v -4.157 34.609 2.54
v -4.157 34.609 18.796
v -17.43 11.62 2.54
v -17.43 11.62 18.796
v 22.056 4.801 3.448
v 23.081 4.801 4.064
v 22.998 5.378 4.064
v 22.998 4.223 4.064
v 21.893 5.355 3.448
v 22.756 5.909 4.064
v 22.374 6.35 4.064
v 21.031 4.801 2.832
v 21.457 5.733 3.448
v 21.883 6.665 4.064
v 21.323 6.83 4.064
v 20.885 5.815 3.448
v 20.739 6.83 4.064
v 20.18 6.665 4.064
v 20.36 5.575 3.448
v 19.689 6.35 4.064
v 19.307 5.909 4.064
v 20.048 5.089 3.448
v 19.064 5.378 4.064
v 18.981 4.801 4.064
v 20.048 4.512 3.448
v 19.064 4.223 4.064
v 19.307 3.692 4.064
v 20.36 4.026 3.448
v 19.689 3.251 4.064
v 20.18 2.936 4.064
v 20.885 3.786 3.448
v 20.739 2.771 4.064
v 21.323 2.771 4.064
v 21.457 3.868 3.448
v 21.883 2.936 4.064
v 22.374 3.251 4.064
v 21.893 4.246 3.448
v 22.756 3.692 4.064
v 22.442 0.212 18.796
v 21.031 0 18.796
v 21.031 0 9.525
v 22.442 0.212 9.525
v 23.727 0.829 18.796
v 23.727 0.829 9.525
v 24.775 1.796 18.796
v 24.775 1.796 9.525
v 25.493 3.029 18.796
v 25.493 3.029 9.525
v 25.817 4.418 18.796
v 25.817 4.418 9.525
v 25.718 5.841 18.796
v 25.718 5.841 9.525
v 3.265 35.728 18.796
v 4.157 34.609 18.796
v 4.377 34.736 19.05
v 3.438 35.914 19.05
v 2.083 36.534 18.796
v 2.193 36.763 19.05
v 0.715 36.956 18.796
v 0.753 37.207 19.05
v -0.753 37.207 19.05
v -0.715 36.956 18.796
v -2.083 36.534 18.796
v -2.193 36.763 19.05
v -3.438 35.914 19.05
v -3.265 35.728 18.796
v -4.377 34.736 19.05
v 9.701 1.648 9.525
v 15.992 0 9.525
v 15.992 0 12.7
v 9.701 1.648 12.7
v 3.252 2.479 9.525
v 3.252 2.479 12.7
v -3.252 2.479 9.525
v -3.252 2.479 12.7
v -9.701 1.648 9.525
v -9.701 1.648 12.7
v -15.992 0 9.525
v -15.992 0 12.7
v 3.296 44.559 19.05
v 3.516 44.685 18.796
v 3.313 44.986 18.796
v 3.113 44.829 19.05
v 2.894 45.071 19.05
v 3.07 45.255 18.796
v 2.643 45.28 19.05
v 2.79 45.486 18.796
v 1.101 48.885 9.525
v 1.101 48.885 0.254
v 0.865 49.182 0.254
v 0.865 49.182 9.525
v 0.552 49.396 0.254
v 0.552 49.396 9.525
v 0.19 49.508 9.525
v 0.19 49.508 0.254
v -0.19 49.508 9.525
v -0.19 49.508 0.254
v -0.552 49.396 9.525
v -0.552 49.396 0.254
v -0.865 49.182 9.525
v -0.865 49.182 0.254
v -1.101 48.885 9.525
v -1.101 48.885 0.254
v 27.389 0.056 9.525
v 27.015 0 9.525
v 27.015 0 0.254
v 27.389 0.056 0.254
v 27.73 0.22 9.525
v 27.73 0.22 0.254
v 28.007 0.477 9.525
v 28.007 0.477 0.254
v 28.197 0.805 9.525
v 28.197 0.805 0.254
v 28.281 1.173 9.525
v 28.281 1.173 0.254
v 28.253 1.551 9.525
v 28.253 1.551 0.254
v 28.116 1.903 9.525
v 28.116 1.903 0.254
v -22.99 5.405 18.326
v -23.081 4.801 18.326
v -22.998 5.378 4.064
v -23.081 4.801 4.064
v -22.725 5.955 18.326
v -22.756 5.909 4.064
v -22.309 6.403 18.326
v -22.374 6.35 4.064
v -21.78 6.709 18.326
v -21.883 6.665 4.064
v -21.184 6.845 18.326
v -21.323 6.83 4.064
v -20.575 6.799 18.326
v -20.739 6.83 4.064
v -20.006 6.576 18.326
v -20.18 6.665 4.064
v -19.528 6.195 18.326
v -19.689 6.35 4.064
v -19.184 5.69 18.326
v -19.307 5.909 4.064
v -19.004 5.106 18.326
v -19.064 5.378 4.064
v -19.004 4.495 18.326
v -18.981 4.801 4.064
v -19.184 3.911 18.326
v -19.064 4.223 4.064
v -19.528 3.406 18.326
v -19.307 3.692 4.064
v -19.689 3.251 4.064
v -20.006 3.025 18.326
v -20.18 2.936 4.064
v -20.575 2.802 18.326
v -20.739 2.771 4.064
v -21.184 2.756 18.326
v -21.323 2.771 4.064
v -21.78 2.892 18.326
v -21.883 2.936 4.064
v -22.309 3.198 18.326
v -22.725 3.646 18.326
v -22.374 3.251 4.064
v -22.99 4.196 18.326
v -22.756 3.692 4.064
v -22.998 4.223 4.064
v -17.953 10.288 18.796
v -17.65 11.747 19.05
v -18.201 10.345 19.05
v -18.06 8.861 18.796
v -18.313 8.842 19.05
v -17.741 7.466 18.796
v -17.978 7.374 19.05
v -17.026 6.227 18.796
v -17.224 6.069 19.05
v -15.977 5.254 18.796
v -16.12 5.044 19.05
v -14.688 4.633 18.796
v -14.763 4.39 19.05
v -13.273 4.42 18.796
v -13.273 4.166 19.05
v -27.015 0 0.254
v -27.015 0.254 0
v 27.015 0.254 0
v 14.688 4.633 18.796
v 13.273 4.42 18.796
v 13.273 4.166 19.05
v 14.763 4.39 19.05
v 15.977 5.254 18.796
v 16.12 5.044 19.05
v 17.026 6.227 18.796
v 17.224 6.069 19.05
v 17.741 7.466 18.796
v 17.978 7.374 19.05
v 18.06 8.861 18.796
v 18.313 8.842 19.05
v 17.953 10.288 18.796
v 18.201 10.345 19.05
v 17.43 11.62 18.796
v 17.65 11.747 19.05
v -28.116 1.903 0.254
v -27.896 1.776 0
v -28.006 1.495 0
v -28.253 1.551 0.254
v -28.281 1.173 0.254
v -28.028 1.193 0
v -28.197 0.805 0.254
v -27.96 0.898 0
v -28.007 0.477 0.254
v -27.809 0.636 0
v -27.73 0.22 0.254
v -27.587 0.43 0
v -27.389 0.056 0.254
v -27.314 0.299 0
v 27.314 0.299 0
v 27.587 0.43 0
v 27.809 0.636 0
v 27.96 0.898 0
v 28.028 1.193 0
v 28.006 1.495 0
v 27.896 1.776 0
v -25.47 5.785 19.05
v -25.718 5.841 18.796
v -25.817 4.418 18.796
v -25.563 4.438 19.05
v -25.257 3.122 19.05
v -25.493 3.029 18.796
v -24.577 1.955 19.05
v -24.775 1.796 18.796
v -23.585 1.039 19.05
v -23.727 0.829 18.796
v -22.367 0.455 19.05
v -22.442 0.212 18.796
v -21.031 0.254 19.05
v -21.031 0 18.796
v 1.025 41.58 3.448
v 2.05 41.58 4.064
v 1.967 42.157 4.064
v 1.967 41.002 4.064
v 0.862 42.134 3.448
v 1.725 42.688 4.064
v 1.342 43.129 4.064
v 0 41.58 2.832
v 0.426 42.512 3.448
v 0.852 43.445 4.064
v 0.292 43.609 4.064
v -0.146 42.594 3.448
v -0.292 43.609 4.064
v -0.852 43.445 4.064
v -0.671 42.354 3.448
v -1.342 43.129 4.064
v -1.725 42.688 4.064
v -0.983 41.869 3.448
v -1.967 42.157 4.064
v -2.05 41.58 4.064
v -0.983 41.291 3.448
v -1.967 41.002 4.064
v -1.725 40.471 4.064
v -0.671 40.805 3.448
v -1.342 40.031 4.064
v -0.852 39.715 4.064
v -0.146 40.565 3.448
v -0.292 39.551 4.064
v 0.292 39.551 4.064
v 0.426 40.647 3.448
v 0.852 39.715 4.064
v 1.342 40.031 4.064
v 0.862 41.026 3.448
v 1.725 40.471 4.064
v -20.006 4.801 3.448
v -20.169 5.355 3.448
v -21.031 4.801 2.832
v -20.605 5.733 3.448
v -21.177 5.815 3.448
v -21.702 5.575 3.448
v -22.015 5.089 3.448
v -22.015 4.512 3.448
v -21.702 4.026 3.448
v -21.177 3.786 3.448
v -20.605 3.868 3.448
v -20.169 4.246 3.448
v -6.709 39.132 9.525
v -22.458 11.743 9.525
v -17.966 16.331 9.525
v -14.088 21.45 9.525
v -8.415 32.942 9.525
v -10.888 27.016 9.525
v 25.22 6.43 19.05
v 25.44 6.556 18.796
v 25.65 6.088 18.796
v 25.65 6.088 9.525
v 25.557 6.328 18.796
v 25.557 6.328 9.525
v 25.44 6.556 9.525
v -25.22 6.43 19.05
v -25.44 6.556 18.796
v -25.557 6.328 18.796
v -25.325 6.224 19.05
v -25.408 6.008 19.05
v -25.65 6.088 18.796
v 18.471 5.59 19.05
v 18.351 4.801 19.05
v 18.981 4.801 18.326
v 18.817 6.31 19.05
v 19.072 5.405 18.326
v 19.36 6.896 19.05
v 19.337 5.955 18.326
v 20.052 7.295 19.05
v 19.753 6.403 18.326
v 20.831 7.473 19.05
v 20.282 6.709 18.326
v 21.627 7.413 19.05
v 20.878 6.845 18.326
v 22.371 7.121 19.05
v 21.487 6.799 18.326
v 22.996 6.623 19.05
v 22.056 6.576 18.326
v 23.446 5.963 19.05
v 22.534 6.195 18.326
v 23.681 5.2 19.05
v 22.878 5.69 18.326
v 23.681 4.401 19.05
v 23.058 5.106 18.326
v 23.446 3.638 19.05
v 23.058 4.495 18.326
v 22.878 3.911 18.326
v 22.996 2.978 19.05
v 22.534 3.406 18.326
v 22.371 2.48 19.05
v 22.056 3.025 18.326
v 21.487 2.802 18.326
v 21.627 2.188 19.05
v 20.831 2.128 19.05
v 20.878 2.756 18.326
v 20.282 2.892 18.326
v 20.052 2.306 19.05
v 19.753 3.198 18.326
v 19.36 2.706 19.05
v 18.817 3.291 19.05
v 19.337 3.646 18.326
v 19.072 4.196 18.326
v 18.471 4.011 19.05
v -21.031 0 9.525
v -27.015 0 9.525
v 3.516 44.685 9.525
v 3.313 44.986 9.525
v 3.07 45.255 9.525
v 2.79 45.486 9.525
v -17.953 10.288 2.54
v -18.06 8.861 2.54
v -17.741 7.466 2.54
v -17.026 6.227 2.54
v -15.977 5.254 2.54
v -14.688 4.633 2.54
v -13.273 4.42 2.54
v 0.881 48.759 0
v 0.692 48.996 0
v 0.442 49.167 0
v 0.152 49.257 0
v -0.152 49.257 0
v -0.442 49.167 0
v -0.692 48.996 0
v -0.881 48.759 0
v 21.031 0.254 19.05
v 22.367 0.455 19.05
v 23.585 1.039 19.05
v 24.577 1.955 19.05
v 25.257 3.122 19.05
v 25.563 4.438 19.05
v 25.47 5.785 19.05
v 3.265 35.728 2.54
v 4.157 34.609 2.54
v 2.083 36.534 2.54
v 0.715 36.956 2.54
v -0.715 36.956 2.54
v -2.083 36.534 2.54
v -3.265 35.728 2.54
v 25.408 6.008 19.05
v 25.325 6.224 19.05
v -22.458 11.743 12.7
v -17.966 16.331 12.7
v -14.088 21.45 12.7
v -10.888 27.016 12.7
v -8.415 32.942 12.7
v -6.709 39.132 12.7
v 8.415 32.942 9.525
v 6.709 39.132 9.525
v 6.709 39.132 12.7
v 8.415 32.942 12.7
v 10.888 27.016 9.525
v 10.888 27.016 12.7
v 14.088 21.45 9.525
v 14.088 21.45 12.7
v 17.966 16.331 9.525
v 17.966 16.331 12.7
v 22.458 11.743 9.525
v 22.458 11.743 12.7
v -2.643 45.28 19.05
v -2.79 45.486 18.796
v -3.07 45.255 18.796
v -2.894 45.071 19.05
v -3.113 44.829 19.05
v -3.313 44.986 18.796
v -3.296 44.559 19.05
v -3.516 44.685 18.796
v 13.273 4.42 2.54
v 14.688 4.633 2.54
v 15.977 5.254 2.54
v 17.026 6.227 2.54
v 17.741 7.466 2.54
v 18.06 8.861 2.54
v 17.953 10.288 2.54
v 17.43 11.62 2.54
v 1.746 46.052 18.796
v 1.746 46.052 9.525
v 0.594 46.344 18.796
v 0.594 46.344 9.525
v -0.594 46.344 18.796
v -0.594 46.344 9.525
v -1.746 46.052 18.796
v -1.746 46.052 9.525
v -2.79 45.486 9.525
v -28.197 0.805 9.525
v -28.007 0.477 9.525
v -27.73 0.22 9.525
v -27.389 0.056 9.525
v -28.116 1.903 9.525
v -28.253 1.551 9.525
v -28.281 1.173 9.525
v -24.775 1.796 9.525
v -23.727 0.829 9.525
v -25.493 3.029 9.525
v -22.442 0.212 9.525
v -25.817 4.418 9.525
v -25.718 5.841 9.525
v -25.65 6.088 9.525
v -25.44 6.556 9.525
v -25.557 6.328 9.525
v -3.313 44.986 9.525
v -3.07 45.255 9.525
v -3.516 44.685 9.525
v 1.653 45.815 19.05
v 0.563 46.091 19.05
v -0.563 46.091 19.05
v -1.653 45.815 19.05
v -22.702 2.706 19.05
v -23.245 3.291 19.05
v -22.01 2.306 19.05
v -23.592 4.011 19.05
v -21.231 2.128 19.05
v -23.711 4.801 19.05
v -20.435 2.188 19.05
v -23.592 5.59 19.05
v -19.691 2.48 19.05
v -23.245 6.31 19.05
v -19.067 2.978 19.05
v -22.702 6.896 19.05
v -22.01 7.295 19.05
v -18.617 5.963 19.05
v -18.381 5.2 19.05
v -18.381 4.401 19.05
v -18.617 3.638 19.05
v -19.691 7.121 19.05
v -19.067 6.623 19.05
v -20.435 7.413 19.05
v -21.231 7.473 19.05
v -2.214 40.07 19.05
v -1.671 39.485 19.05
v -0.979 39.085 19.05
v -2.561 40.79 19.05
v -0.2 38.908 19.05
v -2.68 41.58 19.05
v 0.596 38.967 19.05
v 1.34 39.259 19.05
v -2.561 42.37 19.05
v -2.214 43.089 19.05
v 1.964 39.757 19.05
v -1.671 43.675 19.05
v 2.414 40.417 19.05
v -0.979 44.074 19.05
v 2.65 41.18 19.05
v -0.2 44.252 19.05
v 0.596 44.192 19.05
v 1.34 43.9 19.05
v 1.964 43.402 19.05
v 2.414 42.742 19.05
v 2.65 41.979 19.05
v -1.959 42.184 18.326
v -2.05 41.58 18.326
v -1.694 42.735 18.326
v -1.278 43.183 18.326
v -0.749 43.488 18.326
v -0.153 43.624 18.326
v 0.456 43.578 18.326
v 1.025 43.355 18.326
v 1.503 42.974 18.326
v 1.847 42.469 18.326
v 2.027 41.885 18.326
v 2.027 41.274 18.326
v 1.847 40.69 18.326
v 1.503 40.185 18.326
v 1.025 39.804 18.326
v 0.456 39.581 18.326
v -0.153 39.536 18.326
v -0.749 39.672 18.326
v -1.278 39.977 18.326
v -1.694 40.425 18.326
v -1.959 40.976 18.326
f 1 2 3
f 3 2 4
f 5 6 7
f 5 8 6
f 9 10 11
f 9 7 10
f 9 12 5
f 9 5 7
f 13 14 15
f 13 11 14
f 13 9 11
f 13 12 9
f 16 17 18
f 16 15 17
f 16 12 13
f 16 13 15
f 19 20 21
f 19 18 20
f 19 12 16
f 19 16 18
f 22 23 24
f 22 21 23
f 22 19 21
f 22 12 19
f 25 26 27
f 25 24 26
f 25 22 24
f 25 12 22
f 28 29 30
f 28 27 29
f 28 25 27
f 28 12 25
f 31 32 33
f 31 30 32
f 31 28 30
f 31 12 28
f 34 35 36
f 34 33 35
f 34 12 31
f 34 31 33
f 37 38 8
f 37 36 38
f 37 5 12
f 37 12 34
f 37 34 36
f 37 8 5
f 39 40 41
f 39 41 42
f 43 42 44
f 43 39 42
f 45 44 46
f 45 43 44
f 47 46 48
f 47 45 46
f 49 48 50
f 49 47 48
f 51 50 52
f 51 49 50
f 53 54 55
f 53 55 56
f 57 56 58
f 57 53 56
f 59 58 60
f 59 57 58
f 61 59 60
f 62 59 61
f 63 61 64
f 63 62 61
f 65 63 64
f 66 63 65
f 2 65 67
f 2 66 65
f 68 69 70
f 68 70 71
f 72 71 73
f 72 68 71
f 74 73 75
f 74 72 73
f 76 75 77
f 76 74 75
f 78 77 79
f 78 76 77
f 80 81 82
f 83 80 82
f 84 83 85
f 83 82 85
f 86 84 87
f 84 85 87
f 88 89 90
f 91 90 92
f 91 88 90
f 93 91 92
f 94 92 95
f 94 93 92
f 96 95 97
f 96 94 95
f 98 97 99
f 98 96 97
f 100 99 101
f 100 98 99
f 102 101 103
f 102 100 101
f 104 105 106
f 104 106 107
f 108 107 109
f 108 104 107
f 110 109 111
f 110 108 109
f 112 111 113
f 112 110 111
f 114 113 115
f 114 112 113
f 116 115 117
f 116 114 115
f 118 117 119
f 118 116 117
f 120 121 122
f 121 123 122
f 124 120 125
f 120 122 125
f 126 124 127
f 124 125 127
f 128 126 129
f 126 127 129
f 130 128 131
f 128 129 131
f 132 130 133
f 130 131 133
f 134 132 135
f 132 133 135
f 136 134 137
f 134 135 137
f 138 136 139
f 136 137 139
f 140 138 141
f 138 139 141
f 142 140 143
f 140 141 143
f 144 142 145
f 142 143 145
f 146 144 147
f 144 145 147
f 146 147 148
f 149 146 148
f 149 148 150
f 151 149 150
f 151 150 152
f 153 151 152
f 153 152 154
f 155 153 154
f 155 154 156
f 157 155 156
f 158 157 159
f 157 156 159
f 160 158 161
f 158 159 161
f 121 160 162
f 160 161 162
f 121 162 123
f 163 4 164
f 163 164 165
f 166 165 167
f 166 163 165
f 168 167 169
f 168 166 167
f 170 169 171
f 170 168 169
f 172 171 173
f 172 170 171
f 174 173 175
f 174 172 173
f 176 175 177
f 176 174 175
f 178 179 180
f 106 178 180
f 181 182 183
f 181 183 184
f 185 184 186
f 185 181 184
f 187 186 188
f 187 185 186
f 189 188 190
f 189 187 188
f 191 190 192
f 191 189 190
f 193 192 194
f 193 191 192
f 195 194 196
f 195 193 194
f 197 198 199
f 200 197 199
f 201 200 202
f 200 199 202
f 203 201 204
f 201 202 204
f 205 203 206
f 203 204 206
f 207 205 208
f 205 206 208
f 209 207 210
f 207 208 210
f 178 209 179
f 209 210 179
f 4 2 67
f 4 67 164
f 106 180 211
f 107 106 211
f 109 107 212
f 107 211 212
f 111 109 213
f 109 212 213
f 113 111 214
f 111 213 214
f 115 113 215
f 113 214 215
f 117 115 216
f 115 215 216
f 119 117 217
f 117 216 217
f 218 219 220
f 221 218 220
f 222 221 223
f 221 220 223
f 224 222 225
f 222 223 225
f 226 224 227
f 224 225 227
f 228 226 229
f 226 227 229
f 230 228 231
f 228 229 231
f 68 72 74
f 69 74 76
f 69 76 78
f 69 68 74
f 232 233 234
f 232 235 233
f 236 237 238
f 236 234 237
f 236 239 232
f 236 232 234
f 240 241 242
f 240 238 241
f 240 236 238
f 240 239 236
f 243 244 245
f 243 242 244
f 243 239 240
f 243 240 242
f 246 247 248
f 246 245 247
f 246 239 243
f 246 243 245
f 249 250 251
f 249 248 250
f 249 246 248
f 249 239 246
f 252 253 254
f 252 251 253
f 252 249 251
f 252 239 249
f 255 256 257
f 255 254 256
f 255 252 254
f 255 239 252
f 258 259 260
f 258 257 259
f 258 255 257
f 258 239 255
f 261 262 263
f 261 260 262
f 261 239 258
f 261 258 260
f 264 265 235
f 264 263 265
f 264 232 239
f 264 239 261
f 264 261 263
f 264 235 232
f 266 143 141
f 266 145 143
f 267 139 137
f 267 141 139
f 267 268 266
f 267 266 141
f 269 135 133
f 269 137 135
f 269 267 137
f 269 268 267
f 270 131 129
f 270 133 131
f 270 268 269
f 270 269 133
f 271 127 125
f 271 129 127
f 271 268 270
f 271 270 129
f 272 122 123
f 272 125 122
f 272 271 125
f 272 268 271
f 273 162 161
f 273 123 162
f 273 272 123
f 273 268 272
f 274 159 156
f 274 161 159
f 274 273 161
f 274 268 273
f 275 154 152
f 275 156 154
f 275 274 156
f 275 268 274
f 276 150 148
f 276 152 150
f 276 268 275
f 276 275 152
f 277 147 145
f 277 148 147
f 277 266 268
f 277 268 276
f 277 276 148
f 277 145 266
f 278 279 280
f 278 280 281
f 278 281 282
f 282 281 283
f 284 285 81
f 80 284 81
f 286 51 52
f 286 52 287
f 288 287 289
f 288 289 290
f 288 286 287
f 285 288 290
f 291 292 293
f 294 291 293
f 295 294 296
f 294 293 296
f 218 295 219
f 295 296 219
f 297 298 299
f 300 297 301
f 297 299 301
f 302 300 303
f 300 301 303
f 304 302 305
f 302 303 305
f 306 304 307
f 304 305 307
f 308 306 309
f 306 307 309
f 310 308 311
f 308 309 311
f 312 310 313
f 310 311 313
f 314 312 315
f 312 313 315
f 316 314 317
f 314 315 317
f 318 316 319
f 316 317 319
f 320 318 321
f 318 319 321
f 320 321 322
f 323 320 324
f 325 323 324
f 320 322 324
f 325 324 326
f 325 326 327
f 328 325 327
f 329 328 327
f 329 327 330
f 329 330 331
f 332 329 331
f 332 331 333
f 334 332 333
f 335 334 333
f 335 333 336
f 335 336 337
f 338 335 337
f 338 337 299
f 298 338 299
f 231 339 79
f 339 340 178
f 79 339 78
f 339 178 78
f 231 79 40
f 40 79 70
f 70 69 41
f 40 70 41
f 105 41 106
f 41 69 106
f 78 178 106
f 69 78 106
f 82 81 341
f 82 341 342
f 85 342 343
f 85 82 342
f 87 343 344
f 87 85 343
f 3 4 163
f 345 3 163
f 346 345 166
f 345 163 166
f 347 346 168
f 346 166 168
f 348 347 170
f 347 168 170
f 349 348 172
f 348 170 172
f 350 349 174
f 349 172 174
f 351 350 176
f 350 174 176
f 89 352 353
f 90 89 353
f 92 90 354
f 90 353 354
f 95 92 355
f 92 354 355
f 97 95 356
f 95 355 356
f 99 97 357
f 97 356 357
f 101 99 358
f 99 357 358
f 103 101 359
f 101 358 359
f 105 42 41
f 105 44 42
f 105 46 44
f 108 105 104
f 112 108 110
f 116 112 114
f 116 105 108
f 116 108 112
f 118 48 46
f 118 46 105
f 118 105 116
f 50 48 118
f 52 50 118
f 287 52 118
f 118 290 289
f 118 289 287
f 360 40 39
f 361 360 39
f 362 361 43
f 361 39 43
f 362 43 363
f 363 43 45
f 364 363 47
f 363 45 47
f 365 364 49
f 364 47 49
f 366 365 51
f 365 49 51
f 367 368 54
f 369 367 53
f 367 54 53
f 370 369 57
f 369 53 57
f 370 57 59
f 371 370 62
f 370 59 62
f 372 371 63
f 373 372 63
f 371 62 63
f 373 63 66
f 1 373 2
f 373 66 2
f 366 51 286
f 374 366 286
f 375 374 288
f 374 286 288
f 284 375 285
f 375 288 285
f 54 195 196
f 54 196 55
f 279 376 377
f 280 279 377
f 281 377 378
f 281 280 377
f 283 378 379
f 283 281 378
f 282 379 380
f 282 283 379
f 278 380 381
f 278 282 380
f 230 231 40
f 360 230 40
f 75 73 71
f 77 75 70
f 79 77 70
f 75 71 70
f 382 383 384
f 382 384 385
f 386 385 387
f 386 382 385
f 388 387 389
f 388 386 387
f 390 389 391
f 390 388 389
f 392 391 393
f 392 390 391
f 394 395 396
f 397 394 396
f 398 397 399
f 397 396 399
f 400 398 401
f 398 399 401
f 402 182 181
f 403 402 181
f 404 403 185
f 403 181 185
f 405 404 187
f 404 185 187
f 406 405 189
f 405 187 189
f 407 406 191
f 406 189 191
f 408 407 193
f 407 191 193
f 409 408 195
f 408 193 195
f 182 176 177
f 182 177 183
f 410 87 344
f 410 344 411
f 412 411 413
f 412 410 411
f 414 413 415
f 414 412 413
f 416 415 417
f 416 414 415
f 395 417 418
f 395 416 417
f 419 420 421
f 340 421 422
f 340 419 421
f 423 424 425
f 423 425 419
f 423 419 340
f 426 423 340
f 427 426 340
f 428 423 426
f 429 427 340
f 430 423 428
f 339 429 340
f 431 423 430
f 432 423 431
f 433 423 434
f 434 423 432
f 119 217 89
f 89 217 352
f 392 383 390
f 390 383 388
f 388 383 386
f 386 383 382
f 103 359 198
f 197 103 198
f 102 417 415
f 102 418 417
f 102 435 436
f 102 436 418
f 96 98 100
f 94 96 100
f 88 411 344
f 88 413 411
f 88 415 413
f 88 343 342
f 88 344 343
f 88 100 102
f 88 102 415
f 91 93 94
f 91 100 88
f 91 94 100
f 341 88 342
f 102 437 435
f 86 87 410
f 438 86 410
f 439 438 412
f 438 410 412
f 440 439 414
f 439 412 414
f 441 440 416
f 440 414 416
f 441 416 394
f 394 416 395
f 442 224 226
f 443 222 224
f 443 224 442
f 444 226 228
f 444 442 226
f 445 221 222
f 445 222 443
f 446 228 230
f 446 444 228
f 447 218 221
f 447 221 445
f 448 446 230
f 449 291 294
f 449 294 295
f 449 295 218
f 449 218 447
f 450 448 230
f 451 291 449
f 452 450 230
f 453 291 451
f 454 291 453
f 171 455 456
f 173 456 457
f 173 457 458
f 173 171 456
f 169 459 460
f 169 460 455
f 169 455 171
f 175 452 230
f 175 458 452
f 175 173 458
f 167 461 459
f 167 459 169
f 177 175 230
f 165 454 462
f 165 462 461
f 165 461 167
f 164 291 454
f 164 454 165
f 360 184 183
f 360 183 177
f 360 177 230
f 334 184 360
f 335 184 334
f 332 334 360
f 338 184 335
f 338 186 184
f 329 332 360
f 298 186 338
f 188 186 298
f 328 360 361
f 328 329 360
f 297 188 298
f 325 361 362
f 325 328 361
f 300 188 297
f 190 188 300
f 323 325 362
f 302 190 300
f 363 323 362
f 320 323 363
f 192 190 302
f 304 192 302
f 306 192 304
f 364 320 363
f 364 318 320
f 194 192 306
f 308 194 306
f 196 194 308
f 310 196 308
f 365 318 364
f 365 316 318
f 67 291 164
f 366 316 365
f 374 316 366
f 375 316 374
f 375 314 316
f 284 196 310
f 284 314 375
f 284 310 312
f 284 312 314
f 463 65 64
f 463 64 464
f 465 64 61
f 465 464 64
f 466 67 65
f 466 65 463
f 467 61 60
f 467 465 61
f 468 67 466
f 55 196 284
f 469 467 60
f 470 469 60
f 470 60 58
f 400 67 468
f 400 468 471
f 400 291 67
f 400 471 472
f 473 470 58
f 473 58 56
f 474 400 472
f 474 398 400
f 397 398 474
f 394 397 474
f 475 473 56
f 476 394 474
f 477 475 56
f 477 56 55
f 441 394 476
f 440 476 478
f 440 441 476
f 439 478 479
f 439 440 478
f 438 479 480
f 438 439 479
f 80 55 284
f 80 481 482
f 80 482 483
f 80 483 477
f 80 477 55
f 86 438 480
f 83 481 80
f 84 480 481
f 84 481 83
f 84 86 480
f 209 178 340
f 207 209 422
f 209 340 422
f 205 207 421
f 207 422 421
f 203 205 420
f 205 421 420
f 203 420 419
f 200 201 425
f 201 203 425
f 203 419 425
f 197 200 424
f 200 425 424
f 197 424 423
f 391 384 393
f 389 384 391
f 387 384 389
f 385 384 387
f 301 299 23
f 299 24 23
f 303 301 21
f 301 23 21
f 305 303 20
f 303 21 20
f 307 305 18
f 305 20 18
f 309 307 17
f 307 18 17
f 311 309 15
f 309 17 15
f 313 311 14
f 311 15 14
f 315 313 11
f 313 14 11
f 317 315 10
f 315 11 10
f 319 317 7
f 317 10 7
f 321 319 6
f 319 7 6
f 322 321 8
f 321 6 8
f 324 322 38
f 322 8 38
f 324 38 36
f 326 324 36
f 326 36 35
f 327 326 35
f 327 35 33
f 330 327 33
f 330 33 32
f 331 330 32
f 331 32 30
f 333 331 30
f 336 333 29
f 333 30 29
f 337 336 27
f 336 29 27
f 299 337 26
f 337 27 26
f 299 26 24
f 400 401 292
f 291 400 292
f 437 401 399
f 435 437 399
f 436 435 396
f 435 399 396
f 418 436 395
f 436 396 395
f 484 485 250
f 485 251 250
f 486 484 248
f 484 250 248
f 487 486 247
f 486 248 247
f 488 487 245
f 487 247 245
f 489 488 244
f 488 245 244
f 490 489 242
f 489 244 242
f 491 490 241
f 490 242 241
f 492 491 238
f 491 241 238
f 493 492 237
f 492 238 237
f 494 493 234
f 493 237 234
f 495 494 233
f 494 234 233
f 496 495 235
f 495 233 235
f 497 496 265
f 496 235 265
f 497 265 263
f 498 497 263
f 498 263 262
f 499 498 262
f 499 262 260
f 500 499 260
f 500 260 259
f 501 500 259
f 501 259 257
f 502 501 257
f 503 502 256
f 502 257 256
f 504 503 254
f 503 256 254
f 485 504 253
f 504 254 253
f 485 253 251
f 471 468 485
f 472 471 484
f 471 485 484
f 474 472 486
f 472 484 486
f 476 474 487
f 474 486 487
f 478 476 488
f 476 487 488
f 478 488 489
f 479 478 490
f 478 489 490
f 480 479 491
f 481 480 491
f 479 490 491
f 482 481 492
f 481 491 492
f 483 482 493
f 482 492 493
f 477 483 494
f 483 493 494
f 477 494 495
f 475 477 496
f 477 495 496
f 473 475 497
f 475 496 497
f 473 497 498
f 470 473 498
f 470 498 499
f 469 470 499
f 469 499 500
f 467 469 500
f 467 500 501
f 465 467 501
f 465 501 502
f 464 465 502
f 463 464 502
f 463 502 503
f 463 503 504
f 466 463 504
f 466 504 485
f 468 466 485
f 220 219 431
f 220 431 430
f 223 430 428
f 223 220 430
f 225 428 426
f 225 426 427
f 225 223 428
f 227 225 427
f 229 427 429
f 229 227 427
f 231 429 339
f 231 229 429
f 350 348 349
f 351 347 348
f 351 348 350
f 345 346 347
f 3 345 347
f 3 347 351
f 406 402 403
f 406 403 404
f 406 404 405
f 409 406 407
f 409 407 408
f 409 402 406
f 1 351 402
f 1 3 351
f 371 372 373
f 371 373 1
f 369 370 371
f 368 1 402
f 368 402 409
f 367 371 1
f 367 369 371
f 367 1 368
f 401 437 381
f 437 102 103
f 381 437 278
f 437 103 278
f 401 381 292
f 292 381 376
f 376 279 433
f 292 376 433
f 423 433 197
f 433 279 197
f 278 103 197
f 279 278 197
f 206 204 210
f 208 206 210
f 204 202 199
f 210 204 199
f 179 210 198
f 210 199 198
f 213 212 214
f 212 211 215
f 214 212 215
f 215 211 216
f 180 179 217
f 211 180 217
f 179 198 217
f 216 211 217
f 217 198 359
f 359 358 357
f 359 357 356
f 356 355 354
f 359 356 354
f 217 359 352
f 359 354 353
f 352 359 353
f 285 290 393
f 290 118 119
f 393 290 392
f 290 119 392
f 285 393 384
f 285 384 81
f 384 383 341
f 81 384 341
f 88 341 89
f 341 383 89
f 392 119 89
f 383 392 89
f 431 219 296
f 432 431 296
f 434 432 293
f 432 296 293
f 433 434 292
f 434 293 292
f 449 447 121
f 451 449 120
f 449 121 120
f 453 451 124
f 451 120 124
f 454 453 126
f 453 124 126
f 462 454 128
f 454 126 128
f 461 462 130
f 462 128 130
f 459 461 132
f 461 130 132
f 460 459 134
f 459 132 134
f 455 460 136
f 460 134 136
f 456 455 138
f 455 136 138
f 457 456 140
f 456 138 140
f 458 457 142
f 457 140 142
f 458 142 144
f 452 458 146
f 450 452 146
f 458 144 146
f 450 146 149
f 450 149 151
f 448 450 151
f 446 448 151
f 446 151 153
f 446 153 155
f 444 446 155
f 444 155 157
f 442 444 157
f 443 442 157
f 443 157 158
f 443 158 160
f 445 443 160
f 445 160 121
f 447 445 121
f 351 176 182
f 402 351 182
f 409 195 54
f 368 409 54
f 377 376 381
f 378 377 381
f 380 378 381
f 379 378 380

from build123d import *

# Parameters (mm, degrees)
PAD_DEPTH        = 19.05
FILLET_R         = 1.27
HOLE_D           = 4.1
HOLE_DEPTH       = 14.986
HOLE_CSINK_D     = 5.3594
HOLE_CSINK_ANGLE = 82
HOLE_TIPS_R      = 2.05
SKETCH002_R      = 63.5
POCKET_DEPTH     = 9.525
POCKET001_DEPTH  = 3.175
POCKET002_DEPTH  = 16.51
FILLET001_R      = 2.54
CHAMFER_SIZE     = 0.254


with BuildPart() as part:
    # Sketch → Pad (new body)
    with BuildSketch(Plane.XY):
        Polygon((-29.21, 0), (29.21, 0), (0, 50.8), align=None)
    extrude(amount=PAD_DEPTH)

    # Fillet
    fillet_edges = [part.edges().sort_by_distance(p)[0] for p in [
        (-29.21, 0, 9.525),
        (29.21, 0, 9.525),
        (0, 50.8, 9.525),
    ]]
    fillet(fillet_edges, radius=FILLET_R)

    # Hole
    with Locations(Plane.XY.offset(19.05)):
        with Locations((0, 41.5798), (21.0312, 4.8006), (-21.0312, 4.8006)):
            CounterSinkHole(HOLE_D / 2, HOLE_CSINK_D / 2, depth=HOLE_DEPTH, counter_sink_angle=HOLE_CSINK_ANGLE)

    # Hole tips → Hole tip 1 section 0
    with BuildSketch(Plane.XY.offset(4.064), mode=Mode.PRIVATE) as hole_tip_1_s0:
        with Locations((0, 41.5798)):
            Circle(HOLE_TIPS_R)
    loft([hole_tip_1_s0.sketch, Vertex(0, 41.5798, 2.832236)], mode=Mode.SUBTRACT)

    # Hole tips → Hole tip 2 section 0
    with BuildSketch(Plane.XY.offset(4.064), mode=Mode.PRIVATE) as hole_tip_2_s0:
        with Locations((21.0312, 4.8006)):
            Circle(HOLE_TIPS_R)
    loft([hole_tip_2_s0.sketch, Vertex(21.0312, 4.8006, 2.832236)], mode=Mode.SUBTRACT)

    # Hole tips → Hole tip 3 section 0
    with BuildSketch(Plane.XY.offset(4.064), mode=Mode.PRIVATE) as hole_tip_3_s0:
        with Locations((-21.0312, 4.8006)):
            Circle(HOLE_TIPS_R)
    loft([hole_tip_3_s0.sketch, Vertex(-21.0312, 4.8006, 2.832236)], mode=Mode.SUBTRACT)

    # Sketch002 (on Face5 of Hole) → Pocket (cut)
    with BuildSketch(Plane.XY.offset(19.05)):
        Circle(SKETCH002_R)
        with BuildLine():
            Line((-25.198579, 7.183604), (-4.167379, 43.962804))
            ThreePointArc((4.167379, 43.962804), (0, 46.3804), (-4.167379, 43.962804))
            Line((4.167379, 43.962804), (25.198579, 7.183604))
            ThreePointArc((21.0312, 0), (25.183646, 2.391668), (25.198579, 7.183604))
            Line((21.0312, 0), (-21.0312, 0))
            ThreePointArc((-25.198579, 7.183604), (-25.183646, 2.391668), (-21.0312, 0))
        make_face(mode=Mode.SUBTRACT)
    extrude(amount=-POCKET_DEPTH, mode=Mode.SUBTRACT)

    # Sketch003 (on Face13 of Pocket) → Pocket001 (cut)
    with BuildSketch(Plane.XY.offset(9.525)):
        with BuildLine():
            ThreePointArc((-62.664993, -0.912406), (-12.437232, 24.117556), (-15.907518, 80.129021))
            Line((-15.907518, 80.129021), (-62.664993, -0.912406))
        make_face()
        with BuildLine():
            ThreePointArc((15.907518, 80.129021), (12.437232, 24.117556), (62.664993, -0.912406))
            Line((15.907518, 80.129021), (62.664993, -0.912406))
        make_face()
        with BuildLine():
            ThreePointArc((46.781338, -28.414351), (0, 2.582963), (-46.781338, -28.414351))
            Line((46.781338, -28.414351), (-46.781338, -28.414351))
        make_face()
    extrude(amount=POCKET001_DEPTH, mode=Mode.SUBTRACT)

    # Sketch004 (on Face6 of Pocket001) → Pocket002 (cut)
    with BuildSketch(Plane.XY.offset(19.05)):
        with BuildLine():
            Line((-13.272642, 4.4196), (13.272642, 4.4196))
            ThreePointArc((13.272642, 4.4196), (17.430084, 6.8199), (17.430084, 11.6205))
            Line((17.430084, 11.6205), (4.157442, 34.609391))
            ThreePointArc((4.157442, 34.609391), (0, 37.009691), (-4.157442, 34.609391))
            Line((-4.157442, 34.609391), (-17.430084, 11.6205))
            ThreePointArc((-17.430084, 11.6205), (-17.430084, 6.8199), (-13.272642, 4.4196))
        make_face()
    extrude(amount=-POCKET002_DEPTH, mode=Mode.SUBTRACT)

    # Fillet001
    fillet001_edges = [part.edges().sort_by_distance(p)[0] for p in [
        (-3.293151, 45.072781, 14.2875),
        (3.293151, 45.072781, 14.2875),
        (25.597076, 6.283346, 14.2875),
        (-25.597076, 6.283346, 14.2875),
    ]]
    fillet(fillet001_edges, radius=FILLET001_R)

    # Chamfer
    chamfer_edges = [part.edges().sort_by_distance(p)[0] for p in [
        (-10.793763, 23.114945, 19.05),
        (-14.477962, 25.620935, 19.05),
        (0, 0, 0),
    ]]
    chamfer(chamfer_edges, length=CHAMFER_SIZE)


solid = part.part
